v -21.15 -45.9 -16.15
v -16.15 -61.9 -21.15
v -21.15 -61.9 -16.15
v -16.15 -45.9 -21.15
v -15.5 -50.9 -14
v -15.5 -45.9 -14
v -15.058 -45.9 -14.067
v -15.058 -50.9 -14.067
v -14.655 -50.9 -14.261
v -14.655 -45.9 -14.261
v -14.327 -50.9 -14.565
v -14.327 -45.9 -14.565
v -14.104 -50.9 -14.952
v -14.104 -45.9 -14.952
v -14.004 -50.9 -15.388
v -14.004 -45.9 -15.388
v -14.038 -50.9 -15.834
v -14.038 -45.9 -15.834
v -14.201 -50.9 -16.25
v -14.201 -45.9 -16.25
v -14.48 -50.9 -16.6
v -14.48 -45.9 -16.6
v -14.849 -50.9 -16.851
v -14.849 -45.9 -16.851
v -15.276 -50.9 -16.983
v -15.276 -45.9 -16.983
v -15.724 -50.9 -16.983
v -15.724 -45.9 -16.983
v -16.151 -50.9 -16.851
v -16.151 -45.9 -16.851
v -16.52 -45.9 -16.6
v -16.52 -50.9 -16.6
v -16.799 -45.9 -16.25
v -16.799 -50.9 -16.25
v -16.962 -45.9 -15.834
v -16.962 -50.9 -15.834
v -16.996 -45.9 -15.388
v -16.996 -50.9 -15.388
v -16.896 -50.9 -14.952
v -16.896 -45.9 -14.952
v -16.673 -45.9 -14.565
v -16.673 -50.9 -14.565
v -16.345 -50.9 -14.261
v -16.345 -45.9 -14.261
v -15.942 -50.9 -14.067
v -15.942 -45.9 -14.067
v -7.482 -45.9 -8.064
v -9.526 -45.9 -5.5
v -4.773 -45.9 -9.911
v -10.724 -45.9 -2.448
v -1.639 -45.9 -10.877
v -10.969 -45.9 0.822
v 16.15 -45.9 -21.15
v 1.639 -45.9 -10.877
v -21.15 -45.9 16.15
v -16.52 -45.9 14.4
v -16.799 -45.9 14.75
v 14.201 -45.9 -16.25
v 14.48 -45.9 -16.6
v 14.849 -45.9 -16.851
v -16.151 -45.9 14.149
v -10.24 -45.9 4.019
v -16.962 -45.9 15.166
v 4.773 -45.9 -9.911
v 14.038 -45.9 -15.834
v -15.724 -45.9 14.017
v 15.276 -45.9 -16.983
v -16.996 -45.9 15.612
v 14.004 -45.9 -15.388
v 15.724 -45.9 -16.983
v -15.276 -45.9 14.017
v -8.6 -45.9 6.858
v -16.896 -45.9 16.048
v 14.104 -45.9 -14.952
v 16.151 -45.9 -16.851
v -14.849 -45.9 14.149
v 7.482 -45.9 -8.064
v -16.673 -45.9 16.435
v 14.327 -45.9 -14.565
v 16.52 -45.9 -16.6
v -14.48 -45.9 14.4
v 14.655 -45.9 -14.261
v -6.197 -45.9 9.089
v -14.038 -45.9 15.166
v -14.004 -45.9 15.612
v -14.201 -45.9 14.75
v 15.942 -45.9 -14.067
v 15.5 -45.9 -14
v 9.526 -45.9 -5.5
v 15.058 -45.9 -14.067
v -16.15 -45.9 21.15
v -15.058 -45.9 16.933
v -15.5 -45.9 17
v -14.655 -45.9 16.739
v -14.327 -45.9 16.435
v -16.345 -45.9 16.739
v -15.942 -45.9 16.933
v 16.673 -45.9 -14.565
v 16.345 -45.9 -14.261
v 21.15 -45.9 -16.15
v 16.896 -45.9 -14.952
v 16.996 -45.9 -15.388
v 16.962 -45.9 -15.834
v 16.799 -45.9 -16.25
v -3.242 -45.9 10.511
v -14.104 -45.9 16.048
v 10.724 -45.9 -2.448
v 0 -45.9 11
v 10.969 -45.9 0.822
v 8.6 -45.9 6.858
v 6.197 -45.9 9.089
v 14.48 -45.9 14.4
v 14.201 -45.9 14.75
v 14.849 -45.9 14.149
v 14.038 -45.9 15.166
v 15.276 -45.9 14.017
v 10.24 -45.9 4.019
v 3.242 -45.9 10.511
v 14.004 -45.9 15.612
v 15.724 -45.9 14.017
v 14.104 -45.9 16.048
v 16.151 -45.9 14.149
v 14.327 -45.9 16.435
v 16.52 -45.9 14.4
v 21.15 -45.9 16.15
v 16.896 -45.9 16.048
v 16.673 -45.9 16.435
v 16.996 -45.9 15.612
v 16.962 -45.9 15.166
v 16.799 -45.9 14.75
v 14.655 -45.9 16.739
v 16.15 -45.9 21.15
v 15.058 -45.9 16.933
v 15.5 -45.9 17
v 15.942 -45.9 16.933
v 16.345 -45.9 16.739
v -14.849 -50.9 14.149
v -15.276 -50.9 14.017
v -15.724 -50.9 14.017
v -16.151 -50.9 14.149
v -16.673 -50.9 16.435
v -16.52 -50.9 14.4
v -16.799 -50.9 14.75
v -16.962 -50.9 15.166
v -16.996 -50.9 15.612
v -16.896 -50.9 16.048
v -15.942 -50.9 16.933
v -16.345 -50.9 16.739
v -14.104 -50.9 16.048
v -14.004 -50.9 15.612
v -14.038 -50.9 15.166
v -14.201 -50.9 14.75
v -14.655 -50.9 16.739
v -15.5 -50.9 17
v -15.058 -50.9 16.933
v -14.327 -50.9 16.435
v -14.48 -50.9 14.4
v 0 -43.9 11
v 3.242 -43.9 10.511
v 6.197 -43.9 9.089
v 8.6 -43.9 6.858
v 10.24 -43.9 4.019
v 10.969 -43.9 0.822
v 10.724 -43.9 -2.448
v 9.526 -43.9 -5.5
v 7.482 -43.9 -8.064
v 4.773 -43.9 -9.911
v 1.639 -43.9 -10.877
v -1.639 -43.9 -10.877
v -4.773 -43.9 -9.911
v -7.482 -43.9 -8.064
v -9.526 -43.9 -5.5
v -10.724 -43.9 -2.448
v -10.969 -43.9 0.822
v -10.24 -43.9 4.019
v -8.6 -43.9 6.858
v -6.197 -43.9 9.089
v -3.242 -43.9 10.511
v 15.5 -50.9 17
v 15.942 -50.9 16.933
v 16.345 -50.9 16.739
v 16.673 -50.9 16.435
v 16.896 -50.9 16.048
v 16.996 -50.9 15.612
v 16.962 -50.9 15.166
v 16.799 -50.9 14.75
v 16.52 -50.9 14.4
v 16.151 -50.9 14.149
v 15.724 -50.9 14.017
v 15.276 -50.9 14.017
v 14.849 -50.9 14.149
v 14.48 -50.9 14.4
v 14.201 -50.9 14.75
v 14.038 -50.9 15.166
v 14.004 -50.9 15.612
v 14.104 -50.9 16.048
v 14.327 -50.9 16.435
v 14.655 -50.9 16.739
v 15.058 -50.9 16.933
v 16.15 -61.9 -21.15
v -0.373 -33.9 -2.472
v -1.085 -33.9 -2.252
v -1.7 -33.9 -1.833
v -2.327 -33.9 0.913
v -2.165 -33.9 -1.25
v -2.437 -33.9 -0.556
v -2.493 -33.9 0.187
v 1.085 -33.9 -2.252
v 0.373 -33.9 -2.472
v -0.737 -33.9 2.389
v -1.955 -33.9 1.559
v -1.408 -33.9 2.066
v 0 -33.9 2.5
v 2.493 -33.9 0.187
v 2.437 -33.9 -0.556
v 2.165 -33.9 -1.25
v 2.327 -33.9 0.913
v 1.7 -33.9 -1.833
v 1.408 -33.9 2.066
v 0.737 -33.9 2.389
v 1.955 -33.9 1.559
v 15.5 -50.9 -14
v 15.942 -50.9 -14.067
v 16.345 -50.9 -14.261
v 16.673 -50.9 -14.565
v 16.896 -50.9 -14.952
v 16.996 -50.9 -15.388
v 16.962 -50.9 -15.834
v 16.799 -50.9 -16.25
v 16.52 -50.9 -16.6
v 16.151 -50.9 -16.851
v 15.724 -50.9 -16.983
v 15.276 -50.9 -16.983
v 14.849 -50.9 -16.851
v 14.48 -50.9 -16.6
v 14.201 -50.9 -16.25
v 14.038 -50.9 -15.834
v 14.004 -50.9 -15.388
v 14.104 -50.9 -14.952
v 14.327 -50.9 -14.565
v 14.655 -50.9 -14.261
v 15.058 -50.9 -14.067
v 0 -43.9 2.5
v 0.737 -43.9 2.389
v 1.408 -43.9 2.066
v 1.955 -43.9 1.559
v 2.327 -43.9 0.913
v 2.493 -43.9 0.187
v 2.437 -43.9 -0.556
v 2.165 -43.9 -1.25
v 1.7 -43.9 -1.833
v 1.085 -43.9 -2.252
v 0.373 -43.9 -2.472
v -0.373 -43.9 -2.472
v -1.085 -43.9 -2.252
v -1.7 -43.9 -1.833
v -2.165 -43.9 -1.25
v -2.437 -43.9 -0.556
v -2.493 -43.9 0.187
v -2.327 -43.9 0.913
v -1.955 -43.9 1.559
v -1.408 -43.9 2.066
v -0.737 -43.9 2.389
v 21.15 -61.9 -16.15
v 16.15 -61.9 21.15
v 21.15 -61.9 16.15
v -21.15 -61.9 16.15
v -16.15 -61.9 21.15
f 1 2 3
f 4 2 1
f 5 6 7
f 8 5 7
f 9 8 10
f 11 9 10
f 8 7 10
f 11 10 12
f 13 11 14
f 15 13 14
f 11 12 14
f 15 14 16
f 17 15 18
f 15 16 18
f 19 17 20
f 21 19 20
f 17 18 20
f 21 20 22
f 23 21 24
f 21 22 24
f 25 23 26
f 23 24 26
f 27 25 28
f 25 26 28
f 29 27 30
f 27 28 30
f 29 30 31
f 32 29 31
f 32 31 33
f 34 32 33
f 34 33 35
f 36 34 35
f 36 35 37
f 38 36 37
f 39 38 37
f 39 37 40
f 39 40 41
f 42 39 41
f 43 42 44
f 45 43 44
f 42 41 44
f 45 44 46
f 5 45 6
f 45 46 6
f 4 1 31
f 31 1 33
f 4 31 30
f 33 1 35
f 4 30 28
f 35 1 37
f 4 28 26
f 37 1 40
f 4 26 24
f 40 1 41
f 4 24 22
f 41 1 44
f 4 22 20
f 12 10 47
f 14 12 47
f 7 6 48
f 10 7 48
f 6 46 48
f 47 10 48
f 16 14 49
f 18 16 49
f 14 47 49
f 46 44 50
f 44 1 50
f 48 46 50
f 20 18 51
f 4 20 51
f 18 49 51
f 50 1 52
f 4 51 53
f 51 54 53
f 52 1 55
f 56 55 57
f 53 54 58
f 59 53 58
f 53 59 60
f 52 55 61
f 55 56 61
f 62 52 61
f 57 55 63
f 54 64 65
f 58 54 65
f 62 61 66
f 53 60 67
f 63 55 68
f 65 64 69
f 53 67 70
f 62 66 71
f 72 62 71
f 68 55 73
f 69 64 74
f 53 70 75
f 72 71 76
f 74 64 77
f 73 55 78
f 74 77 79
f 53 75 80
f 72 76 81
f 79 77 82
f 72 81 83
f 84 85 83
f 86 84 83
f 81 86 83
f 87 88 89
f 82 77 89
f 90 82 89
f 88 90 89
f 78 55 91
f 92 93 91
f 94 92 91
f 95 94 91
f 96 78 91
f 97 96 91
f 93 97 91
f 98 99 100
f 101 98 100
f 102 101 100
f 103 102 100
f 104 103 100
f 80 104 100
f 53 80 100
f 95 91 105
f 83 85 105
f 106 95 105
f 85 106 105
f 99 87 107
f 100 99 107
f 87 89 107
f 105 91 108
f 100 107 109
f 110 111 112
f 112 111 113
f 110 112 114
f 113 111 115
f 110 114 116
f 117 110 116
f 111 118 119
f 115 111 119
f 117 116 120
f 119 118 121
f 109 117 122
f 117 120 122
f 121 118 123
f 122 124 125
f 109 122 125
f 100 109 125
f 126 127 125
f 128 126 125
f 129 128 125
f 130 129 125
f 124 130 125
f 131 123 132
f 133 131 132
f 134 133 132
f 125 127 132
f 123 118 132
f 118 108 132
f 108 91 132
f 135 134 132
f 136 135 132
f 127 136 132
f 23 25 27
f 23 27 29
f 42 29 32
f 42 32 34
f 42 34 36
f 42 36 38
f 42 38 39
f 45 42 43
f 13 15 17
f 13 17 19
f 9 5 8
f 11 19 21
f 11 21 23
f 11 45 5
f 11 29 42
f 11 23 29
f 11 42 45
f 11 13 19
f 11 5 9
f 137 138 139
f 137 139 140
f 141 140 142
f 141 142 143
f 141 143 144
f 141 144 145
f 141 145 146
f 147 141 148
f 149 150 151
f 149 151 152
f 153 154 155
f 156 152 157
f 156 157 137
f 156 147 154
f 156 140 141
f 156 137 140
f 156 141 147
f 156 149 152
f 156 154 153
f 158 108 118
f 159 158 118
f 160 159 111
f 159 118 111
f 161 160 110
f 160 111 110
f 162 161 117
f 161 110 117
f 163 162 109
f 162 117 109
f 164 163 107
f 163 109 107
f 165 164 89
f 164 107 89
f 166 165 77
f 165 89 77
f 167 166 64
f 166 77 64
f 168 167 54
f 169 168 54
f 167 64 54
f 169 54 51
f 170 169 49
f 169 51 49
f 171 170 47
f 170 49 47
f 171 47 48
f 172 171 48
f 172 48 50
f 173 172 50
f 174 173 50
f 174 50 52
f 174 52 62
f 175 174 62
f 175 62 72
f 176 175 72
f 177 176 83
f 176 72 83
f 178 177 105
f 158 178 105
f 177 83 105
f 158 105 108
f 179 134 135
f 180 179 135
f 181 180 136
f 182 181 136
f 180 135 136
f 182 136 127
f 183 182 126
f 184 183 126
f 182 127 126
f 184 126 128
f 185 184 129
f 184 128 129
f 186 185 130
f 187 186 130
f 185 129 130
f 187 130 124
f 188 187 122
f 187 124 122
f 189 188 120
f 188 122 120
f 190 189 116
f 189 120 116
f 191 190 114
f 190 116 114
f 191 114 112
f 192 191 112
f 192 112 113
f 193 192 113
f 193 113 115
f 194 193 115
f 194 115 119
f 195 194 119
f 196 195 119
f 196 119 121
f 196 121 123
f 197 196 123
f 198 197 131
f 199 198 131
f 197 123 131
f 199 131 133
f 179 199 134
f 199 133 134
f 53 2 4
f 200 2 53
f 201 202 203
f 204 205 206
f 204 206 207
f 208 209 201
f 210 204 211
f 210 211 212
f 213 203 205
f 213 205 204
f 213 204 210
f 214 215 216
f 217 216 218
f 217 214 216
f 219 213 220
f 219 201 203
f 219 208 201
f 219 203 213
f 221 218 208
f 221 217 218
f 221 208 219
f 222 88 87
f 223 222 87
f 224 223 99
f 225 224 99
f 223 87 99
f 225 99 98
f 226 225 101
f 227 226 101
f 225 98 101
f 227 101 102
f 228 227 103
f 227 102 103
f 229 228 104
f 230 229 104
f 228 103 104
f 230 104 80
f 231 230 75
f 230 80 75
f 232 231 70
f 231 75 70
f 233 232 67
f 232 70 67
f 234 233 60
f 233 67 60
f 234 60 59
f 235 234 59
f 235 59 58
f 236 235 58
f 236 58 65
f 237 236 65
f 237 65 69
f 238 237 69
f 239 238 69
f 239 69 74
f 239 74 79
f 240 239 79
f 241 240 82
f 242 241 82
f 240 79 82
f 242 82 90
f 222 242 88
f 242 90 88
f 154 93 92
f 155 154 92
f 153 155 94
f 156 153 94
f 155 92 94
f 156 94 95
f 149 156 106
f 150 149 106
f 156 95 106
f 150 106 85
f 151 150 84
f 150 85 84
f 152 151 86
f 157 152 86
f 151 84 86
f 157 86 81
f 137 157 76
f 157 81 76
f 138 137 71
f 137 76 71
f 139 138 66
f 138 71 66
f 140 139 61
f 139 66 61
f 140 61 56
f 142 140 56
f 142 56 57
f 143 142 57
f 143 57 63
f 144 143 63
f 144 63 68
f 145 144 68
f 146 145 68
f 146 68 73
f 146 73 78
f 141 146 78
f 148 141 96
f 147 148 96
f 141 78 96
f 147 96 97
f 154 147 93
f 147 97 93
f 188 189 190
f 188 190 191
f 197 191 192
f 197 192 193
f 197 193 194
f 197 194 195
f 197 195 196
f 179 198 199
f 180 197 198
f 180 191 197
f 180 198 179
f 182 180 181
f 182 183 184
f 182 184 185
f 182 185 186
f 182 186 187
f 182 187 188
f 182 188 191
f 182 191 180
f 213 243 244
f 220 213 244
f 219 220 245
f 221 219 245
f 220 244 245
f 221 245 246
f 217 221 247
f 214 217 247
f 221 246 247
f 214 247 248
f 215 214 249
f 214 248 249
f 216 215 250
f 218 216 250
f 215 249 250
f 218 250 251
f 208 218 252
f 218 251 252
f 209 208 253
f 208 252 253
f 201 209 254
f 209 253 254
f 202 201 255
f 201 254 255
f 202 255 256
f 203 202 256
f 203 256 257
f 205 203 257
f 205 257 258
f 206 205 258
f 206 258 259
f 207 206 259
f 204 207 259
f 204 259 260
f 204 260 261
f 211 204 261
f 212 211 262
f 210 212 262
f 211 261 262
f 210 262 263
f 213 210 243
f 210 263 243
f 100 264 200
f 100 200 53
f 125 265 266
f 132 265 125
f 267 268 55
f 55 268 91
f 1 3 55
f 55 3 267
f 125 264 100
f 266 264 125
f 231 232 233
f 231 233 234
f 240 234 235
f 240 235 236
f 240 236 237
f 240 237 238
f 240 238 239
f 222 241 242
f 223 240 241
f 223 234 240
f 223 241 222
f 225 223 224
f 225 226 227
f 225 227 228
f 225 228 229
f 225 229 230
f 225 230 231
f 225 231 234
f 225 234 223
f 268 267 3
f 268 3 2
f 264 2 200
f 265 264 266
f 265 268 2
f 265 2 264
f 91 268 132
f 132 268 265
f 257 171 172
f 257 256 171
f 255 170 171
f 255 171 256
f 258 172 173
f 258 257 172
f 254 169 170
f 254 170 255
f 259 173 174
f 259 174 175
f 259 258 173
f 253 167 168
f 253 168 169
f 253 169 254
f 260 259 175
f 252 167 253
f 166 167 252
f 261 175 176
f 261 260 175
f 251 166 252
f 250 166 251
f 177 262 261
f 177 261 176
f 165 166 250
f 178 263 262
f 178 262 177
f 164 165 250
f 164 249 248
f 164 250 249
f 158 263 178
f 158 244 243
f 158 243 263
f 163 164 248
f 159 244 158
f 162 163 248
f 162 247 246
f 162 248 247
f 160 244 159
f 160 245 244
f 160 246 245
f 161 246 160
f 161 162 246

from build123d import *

# Parameters (mm, degrees)
SKETCH_1_W          = 42.3
SKETCH_1_H          = 42.3
EXTRUDE_1_DEPTH     = 16
CHAMFER_1_SIZE      = 5
SKETCH_2_R          = 11
EXTRUDE_2_DEPTH     = 2
SKETCH_3_R          = 1.5
CUT_EXTRUDE_1_DEPTH = 5
SKETCH_4_R          = 2.5
EXTRUDE_3_DEPTH     = 10


with BuildPart() as part:
    # 草图1 → 凸台-拉伸1 (new body)
    with BuildSketch(Plane.XZ.offset(61.9)):
        Rectangle(SKETCH_1_W, SKETCH_1_H)
    extrude(amount=-EXTRUDE_1_DEPTH)

    # 倒角1
    chamfer_1_edges = [part.edges().sort_by_distance(p)[0] for p in [
        (-21.15, -53.9, -21.15),
        (-21.15, -53.9, 21.15),
        (21.15, -53.9, 21.15),
        (21.15, -53.9, -21.15),
    ]]
    chamfer(chamfer_1_edges, length=CHAMFER_1_SIZE)

    # 草图2 → 凸台-拉伸2 (add)
    with BuildSketch(Plane(origin=(0, -45.9, 0), x_dir=(-1, 0, 0), z_dir=(0, 1, 0))):
        with Locations(Location((0, 0, 0), (0, 0, 90))):
            Circle(SKETCH_2_R)
    extrude(amount=EXTRUDE_2_DEPTH)

    # 草图3 → 切除-拉伸1 (cut)
    with BuildSketch(Plane(origin=(0, -45.9, 0), x_dir=(1, 0, 0), z_dir=(0, 1, 0))):
        with Locations(Location((-15.5, 15.5, 0), (0, 0, 270))):
            Circle(SKETCH_3_R)
        with Locations(Location((15.5, 15.5, 0), (0, 0, 270))):
            Circle(SKETCH_3_R)
        with Locations(Location((15.5, -15.5, 0), (0, 0, 270))):
            Circle(SKETCH_3_R)
        with Locations(Location((-15.5, -15.5, 0), (0, 0, 270))):
            Circle(SKETCH_3_R)
    extrude(amount=-CUT_EXTRUDE_1_DEPTH, mode=Mode.SUBTRACT)

    # 草图4 → 凸台-拉伸3 (add)
    with BuildSketch(Plane(origin=(0, -43.9, 0), x_dir=(1, 0, 0), z_dir=(0, 1, 0))):
        with Locations(Location((0, 0, 0), (0, 0, 270))):
            Circle(SKETCH_4_R)
    extrude(amount=EXTRUDE_3_DEPTH)


solid = part.part
